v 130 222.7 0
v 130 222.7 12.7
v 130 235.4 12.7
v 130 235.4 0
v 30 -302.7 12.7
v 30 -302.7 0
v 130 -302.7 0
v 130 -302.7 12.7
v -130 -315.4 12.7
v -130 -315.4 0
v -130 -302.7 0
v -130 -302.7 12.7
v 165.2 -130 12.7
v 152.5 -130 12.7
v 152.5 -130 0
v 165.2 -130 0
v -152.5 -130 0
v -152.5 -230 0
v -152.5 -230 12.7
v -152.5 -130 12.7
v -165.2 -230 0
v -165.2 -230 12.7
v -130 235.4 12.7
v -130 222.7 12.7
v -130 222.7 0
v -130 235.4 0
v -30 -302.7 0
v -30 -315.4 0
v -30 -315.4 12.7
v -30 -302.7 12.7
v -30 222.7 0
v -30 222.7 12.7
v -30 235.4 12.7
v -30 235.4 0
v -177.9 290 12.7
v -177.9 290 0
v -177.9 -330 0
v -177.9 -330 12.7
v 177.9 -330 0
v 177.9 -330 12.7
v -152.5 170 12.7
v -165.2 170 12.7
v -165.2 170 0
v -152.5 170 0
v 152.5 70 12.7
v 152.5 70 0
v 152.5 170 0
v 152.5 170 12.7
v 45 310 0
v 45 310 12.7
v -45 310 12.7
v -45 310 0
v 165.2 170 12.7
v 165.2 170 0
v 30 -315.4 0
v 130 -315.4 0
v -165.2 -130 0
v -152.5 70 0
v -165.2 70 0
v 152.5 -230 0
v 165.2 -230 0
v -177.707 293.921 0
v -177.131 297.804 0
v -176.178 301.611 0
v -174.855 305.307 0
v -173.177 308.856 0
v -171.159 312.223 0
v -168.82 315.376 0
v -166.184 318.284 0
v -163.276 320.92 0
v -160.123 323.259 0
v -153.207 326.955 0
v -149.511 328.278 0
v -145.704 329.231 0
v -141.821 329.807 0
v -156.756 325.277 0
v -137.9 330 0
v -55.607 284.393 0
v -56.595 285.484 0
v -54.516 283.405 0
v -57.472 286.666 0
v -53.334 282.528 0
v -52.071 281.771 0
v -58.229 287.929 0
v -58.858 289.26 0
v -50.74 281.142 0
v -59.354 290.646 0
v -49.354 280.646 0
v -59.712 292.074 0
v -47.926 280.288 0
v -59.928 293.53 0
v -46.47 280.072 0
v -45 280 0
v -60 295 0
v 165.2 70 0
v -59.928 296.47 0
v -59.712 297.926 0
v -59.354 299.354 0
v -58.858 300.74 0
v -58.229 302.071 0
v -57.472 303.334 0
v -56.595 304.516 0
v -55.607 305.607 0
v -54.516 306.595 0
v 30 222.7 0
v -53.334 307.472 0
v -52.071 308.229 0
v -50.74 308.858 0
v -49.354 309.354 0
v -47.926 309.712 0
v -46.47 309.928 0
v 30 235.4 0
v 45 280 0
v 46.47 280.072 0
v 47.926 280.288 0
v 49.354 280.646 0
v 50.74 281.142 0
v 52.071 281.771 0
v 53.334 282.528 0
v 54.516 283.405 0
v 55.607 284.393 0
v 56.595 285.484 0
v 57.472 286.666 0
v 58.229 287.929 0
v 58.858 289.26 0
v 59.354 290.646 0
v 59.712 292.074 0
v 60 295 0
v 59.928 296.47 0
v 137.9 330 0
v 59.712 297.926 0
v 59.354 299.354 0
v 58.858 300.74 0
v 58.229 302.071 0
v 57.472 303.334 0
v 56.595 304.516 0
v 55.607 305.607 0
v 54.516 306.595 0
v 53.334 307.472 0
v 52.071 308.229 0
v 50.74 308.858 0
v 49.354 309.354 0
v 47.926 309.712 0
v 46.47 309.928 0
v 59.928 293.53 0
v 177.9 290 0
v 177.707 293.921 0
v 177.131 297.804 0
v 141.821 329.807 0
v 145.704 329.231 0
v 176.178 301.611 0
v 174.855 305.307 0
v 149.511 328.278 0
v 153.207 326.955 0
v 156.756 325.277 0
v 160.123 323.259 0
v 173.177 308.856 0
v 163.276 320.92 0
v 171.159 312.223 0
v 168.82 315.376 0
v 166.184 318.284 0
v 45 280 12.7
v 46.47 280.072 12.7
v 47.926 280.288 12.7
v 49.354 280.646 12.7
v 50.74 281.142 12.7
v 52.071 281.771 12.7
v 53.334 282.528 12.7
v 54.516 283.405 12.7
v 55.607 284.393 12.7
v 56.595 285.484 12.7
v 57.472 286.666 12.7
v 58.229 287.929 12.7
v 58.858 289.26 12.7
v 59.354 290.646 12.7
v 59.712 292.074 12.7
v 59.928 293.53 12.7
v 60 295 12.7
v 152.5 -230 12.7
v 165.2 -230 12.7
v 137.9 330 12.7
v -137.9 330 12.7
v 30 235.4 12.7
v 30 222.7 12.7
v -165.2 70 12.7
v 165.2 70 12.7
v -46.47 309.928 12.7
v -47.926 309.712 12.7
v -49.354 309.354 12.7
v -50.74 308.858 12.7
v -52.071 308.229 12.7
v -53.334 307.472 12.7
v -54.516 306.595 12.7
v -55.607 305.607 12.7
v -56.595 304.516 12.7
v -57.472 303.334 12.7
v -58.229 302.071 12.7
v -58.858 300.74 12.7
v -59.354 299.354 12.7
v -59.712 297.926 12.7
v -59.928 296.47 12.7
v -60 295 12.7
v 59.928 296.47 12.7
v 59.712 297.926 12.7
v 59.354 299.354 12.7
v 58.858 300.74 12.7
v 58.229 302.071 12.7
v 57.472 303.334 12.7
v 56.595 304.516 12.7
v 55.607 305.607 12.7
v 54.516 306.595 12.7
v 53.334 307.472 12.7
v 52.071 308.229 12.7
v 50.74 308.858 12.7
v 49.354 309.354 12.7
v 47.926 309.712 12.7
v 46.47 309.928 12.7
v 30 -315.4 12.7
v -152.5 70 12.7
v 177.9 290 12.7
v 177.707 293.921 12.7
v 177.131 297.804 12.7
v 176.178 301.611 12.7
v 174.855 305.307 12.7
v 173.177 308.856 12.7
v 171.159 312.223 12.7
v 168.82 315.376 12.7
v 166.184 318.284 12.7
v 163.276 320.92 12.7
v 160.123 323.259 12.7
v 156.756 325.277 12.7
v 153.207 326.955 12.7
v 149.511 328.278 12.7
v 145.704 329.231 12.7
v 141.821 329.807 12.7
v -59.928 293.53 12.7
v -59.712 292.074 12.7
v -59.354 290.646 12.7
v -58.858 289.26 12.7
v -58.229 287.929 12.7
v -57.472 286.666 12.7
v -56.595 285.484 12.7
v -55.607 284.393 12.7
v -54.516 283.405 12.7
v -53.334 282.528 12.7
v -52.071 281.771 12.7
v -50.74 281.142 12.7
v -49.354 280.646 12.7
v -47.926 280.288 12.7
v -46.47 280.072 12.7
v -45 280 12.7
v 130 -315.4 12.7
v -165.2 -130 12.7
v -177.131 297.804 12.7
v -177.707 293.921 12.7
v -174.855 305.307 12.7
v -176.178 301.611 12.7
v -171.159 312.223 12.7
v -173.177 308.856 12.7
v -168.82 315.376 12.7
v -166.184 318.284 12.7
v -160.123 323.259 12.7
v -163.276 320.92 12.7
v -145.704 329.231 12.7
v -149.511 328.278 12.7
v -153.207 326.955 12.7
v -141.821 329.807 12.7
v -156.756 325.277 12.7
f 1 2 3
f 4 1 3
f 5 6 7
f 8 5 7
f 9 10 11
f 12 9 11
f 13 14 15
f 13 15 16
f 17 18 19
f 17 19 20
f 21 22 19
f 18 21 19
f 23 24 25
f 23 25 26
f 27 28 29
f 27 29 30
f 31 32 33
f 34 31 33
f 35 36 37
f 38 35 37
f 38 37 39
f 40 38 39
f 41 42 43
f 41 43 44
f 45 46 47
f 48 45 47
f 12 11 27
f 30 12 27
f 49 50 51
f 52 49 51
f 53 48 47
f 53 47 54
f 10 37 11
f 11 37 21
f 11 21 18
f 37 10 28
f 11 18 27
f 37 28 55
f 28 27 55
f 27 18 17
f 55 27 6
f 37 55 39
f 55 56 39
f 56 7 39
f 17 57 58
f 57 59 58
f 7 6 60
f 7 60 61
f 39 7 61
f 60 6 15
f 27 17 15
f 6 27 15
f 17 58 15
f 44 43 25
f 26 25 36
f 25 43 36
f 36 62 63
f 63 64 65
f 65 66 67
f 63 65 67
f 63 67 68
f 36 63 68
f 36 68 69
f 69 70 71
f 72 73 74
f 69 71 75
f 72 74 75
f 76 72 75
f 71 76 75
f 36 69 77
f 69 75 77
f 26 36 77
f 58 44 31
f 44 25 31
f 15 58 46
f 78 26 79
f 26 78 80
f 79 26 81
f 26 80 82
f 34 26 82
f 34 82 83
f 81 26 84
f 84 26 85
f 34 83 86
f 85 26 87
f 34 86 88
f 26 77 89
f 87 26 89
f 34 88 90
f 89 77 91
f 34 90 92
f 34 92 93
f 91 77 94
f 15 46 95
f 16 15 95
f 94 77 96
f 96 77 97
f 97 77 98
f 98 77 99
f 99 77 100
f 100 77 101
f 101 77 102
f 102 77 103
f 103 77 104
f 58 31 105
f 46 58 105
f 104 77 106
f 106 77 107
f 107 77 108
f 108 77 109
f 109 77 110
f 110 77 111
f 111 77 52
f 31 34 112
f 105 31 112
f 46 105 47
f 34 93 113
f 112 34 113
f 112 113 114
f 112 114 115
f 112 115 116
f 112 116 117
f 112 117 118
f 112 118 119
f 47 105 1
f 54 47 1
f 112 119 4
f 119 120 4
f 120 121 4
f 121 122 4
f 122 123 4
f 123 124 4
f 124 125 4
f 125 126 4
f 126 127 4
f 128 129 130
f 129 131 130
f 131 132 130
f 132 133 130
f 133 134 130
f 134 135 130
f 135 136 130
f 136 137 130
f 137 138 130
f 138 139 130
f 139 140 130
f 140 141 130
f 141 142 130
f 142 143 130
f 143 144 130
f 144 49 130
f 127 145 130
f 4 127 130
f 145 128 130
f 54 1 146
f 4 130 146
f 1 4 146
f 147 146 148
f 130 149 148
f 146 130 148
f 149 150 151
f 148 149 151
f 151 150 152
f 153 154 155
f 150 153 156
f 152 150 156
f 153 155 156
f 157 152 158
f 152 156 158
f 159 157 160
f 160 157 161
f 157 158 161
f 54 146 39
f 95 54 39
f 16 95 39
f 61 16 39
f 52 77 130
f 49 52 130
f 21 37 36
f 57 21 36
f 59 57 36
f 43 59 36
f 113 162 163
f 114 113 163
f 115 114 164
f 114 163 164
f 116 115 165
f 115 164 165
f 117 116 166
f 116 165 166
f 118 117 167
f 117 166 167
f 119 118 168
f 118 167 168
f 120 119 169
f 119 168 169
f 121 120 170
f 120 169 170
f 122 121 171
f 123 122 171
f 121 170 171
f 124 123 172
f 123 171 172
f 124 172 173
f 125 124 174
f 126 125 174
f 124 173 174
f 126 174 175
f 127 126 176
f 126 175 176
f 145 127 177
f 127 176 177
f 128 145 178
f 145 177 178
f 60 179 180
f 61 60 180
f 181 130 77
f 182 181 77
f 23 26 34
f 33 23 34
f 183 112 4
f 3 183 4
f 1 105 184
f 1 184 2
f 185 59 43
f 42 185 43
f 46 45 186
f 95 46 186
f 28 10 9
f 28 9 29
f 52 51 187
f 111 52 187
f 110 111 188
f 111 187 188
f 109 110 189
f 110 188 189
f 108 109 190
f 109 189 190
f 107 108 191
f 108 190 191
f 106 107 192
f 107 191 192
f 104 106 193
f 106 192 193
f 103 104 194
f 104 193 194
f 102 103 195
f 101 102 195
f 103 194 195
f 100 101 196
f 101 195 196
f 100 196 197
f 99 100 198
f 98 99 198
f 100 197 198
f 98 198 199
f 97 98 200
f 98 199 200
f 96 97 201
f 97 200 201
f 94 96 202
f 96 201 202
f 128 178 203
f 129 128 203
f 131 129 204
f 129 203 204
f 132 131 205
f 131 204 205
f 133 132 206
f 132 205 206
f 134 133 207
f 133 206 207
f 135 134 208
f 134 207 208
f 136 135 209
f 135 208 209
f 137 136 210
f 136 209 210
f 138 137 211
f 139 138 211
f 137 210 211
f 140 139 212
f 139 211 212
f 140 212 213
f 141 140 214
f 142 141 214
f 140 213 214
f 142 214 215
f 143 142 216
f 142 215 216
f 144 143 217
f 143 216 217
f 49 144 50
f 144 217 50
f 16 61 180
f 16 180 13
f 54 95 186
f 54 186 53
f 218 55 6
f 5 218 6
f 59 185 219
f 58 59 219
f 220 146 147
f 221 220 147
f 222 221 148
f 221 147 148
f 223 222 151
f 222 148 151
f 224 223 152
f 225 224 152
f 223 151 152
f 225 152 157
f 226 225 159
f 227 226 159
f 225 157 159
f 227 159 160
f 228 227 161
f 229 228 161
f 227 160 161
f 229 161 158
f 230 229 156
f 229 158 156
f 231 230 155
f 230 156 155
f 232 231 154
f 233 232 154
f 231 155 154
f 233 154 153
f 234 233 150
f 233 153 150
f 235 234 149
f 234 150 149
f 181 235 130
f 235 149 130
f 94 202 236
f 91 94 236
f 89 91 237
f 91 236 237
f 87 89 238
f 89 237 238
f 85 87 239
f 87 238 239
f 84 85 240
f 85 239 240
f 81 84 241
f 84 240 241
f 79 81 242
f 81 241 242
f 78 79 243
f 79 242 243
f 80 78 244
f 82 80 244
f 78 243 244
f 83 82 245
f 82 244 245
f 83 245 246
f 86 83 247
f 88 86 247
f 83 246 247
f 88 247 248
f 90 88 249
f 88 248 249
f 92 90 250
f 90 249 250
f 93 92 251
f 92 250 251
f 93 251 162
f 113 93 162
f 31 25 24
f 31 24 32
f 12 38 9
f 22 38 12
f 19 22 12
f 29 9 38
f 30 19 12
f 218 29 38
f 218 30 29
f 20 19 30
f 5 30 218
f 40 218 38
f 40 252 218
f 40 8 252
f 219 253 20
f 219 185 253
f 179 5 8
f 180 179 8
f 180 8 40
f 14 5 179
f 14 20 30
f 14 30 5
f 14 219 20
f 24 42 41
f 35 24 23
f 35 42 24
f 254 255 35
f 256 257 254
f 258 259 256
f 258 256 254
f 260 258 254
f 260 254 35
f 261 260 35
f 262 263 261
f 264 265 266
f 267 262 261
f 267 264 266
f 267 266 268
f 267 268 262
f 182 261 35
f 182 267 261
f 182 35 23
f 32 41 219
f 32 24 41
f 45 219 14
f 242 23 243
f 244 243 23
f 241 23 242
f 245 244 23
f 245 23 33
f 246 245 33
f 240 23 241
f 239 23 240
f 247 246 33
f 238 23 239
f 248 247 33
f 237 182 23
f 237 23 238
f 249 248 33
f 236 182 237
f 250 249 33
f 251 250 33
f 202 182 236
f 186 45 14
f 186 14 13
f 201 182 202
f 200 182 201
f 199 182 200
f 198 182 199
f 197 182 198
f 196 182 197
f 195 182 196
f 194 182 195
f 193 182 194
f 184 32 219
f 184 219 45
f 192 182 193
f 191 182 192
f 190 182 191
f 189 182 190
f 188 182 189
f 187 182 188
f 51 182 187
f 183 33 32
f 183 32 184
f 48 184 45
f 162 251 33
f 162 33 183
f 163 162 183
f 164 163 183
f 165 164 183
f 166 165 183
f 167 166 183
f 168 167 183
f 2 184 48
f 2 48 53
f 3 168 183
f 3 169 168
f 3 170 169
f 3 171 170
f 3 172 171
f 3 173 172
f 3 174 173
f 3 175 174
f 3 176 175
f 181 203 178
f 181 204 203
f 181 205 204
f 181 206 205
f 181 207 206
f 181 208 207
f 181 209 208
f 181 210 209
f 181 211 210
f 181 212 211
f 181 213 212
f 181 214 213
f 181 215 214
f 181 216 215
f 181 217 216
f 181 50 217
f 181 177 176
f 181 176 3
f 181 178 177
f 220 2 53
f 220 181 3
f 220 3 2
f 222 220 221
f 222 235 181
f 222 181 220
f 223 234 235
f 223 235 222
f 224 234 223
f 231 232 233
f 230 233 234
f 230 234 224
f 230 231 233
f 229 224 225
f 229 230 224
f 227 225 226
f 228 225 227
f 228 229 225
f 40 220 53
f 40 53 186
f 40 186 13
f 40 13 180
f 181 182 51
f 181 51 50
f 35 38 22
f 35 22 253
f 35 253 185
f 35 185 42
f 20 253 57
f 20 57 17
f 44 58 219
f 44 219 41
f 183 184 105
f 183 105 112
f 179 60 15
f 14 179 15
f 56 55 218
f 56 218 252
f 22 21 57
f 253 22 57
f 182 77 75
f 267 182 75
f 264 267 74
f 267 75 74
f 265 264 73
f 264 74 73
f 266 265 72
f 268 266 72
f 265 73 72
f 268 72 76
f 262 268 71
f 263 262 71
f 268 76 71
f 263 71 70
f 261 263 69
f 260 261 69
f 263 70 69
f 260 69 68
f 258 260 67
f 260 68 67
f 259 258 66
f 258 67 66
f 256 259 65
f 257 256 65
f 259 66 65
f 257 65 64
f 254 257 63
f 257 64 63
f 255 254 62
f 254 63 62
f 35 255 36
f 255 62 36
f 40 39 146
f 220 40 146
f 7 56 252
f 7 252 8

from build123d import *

# Parameters (mm, degrees)
F0_W     = 12.7
F0_H     = 100
F0_W_2   = 100
F0_H_2   = 12.7
F1_DEPTH = 12.7
F3_DEPTH = 12.7


with BuildPart() as f1:
    # F0 (on Top) → F1 (new body)
    with BuildSketch(Plane.XY):
        with BuildLine():
            Line((-177.9, -330), (177.9, -330))
            Line((177.9, -330), (177.9, 290))
            ThreePointArc((177.9, 290), (166.184271, 318.284271), (137.9, 330))
            Line((137.9, 330), (-137.9, 330))
            ThreePointArc((-137.9, 330), (-166.184271, 318.284271), (-177.9, 290))
            Line((-177.9, 290), (-177.9, -330))
        make_face()
        with Locations((-158.85, -180)):
            Rectangle(F0_W, F0_H, mode=Mode.SUBTRACT)
        with Locations((-80, -309.05)):
            Rectangle(F0_W_2, F0_H_2, mode=Mode.SUBTRACT)
        with Locations((80, -309.05)):
            Rectangle(F0_W_2, F0_H_2, mode=Mode.SUBTRACT)
        with Locations((158.85, -180)):
            Rectangle(F0_W, F0_H, mode=Mode.SUBTRACT)
        with Locations((-158.85, 120)):
            Rectangle(F0_W, F0_H, mode=Mode.SUBTRACT)
        with Locations((-80, 229.05)):
            Rectangle(F0_W_2, F0_H_2, mode=Mode.SUBTRACT)
        with Locations((158.85, 120)):
            Rectangle(F0_W, F0_H, mode=Mode.SUBTRACT)
        with Locations((80, 229.05)):
            Rectangle(F0_W_2, F0_H_2, mode=Mode.SUBTRACT)
    extrude(amount=F1_DEPTH)

    # F2 (on face) → F3 (cut, through all)
    with BuildSketch(Plane.XY.offset(12.7)):
        with BuildLine():
            ThreePointArc((-60, 295), (-55.606602, 284.393398), (-45, 280))
            Line((-45, 280), (45, 280))
            ThreePointArc((45, 280), (55.606602, 284.393398), (60, 295))
            ThreePointArc((60, 295), (55.606602, 305.606602), (45, 310))
            Line((45, 310), (-45, 310))
            ThreePointArc((-45, 310), (-55.606602, 305.606602), (-60, 295))
        make_face()
    extrude(amount=-F3_DEPTH, mode=Mode.SUBTRACT)


solid = f1.part
